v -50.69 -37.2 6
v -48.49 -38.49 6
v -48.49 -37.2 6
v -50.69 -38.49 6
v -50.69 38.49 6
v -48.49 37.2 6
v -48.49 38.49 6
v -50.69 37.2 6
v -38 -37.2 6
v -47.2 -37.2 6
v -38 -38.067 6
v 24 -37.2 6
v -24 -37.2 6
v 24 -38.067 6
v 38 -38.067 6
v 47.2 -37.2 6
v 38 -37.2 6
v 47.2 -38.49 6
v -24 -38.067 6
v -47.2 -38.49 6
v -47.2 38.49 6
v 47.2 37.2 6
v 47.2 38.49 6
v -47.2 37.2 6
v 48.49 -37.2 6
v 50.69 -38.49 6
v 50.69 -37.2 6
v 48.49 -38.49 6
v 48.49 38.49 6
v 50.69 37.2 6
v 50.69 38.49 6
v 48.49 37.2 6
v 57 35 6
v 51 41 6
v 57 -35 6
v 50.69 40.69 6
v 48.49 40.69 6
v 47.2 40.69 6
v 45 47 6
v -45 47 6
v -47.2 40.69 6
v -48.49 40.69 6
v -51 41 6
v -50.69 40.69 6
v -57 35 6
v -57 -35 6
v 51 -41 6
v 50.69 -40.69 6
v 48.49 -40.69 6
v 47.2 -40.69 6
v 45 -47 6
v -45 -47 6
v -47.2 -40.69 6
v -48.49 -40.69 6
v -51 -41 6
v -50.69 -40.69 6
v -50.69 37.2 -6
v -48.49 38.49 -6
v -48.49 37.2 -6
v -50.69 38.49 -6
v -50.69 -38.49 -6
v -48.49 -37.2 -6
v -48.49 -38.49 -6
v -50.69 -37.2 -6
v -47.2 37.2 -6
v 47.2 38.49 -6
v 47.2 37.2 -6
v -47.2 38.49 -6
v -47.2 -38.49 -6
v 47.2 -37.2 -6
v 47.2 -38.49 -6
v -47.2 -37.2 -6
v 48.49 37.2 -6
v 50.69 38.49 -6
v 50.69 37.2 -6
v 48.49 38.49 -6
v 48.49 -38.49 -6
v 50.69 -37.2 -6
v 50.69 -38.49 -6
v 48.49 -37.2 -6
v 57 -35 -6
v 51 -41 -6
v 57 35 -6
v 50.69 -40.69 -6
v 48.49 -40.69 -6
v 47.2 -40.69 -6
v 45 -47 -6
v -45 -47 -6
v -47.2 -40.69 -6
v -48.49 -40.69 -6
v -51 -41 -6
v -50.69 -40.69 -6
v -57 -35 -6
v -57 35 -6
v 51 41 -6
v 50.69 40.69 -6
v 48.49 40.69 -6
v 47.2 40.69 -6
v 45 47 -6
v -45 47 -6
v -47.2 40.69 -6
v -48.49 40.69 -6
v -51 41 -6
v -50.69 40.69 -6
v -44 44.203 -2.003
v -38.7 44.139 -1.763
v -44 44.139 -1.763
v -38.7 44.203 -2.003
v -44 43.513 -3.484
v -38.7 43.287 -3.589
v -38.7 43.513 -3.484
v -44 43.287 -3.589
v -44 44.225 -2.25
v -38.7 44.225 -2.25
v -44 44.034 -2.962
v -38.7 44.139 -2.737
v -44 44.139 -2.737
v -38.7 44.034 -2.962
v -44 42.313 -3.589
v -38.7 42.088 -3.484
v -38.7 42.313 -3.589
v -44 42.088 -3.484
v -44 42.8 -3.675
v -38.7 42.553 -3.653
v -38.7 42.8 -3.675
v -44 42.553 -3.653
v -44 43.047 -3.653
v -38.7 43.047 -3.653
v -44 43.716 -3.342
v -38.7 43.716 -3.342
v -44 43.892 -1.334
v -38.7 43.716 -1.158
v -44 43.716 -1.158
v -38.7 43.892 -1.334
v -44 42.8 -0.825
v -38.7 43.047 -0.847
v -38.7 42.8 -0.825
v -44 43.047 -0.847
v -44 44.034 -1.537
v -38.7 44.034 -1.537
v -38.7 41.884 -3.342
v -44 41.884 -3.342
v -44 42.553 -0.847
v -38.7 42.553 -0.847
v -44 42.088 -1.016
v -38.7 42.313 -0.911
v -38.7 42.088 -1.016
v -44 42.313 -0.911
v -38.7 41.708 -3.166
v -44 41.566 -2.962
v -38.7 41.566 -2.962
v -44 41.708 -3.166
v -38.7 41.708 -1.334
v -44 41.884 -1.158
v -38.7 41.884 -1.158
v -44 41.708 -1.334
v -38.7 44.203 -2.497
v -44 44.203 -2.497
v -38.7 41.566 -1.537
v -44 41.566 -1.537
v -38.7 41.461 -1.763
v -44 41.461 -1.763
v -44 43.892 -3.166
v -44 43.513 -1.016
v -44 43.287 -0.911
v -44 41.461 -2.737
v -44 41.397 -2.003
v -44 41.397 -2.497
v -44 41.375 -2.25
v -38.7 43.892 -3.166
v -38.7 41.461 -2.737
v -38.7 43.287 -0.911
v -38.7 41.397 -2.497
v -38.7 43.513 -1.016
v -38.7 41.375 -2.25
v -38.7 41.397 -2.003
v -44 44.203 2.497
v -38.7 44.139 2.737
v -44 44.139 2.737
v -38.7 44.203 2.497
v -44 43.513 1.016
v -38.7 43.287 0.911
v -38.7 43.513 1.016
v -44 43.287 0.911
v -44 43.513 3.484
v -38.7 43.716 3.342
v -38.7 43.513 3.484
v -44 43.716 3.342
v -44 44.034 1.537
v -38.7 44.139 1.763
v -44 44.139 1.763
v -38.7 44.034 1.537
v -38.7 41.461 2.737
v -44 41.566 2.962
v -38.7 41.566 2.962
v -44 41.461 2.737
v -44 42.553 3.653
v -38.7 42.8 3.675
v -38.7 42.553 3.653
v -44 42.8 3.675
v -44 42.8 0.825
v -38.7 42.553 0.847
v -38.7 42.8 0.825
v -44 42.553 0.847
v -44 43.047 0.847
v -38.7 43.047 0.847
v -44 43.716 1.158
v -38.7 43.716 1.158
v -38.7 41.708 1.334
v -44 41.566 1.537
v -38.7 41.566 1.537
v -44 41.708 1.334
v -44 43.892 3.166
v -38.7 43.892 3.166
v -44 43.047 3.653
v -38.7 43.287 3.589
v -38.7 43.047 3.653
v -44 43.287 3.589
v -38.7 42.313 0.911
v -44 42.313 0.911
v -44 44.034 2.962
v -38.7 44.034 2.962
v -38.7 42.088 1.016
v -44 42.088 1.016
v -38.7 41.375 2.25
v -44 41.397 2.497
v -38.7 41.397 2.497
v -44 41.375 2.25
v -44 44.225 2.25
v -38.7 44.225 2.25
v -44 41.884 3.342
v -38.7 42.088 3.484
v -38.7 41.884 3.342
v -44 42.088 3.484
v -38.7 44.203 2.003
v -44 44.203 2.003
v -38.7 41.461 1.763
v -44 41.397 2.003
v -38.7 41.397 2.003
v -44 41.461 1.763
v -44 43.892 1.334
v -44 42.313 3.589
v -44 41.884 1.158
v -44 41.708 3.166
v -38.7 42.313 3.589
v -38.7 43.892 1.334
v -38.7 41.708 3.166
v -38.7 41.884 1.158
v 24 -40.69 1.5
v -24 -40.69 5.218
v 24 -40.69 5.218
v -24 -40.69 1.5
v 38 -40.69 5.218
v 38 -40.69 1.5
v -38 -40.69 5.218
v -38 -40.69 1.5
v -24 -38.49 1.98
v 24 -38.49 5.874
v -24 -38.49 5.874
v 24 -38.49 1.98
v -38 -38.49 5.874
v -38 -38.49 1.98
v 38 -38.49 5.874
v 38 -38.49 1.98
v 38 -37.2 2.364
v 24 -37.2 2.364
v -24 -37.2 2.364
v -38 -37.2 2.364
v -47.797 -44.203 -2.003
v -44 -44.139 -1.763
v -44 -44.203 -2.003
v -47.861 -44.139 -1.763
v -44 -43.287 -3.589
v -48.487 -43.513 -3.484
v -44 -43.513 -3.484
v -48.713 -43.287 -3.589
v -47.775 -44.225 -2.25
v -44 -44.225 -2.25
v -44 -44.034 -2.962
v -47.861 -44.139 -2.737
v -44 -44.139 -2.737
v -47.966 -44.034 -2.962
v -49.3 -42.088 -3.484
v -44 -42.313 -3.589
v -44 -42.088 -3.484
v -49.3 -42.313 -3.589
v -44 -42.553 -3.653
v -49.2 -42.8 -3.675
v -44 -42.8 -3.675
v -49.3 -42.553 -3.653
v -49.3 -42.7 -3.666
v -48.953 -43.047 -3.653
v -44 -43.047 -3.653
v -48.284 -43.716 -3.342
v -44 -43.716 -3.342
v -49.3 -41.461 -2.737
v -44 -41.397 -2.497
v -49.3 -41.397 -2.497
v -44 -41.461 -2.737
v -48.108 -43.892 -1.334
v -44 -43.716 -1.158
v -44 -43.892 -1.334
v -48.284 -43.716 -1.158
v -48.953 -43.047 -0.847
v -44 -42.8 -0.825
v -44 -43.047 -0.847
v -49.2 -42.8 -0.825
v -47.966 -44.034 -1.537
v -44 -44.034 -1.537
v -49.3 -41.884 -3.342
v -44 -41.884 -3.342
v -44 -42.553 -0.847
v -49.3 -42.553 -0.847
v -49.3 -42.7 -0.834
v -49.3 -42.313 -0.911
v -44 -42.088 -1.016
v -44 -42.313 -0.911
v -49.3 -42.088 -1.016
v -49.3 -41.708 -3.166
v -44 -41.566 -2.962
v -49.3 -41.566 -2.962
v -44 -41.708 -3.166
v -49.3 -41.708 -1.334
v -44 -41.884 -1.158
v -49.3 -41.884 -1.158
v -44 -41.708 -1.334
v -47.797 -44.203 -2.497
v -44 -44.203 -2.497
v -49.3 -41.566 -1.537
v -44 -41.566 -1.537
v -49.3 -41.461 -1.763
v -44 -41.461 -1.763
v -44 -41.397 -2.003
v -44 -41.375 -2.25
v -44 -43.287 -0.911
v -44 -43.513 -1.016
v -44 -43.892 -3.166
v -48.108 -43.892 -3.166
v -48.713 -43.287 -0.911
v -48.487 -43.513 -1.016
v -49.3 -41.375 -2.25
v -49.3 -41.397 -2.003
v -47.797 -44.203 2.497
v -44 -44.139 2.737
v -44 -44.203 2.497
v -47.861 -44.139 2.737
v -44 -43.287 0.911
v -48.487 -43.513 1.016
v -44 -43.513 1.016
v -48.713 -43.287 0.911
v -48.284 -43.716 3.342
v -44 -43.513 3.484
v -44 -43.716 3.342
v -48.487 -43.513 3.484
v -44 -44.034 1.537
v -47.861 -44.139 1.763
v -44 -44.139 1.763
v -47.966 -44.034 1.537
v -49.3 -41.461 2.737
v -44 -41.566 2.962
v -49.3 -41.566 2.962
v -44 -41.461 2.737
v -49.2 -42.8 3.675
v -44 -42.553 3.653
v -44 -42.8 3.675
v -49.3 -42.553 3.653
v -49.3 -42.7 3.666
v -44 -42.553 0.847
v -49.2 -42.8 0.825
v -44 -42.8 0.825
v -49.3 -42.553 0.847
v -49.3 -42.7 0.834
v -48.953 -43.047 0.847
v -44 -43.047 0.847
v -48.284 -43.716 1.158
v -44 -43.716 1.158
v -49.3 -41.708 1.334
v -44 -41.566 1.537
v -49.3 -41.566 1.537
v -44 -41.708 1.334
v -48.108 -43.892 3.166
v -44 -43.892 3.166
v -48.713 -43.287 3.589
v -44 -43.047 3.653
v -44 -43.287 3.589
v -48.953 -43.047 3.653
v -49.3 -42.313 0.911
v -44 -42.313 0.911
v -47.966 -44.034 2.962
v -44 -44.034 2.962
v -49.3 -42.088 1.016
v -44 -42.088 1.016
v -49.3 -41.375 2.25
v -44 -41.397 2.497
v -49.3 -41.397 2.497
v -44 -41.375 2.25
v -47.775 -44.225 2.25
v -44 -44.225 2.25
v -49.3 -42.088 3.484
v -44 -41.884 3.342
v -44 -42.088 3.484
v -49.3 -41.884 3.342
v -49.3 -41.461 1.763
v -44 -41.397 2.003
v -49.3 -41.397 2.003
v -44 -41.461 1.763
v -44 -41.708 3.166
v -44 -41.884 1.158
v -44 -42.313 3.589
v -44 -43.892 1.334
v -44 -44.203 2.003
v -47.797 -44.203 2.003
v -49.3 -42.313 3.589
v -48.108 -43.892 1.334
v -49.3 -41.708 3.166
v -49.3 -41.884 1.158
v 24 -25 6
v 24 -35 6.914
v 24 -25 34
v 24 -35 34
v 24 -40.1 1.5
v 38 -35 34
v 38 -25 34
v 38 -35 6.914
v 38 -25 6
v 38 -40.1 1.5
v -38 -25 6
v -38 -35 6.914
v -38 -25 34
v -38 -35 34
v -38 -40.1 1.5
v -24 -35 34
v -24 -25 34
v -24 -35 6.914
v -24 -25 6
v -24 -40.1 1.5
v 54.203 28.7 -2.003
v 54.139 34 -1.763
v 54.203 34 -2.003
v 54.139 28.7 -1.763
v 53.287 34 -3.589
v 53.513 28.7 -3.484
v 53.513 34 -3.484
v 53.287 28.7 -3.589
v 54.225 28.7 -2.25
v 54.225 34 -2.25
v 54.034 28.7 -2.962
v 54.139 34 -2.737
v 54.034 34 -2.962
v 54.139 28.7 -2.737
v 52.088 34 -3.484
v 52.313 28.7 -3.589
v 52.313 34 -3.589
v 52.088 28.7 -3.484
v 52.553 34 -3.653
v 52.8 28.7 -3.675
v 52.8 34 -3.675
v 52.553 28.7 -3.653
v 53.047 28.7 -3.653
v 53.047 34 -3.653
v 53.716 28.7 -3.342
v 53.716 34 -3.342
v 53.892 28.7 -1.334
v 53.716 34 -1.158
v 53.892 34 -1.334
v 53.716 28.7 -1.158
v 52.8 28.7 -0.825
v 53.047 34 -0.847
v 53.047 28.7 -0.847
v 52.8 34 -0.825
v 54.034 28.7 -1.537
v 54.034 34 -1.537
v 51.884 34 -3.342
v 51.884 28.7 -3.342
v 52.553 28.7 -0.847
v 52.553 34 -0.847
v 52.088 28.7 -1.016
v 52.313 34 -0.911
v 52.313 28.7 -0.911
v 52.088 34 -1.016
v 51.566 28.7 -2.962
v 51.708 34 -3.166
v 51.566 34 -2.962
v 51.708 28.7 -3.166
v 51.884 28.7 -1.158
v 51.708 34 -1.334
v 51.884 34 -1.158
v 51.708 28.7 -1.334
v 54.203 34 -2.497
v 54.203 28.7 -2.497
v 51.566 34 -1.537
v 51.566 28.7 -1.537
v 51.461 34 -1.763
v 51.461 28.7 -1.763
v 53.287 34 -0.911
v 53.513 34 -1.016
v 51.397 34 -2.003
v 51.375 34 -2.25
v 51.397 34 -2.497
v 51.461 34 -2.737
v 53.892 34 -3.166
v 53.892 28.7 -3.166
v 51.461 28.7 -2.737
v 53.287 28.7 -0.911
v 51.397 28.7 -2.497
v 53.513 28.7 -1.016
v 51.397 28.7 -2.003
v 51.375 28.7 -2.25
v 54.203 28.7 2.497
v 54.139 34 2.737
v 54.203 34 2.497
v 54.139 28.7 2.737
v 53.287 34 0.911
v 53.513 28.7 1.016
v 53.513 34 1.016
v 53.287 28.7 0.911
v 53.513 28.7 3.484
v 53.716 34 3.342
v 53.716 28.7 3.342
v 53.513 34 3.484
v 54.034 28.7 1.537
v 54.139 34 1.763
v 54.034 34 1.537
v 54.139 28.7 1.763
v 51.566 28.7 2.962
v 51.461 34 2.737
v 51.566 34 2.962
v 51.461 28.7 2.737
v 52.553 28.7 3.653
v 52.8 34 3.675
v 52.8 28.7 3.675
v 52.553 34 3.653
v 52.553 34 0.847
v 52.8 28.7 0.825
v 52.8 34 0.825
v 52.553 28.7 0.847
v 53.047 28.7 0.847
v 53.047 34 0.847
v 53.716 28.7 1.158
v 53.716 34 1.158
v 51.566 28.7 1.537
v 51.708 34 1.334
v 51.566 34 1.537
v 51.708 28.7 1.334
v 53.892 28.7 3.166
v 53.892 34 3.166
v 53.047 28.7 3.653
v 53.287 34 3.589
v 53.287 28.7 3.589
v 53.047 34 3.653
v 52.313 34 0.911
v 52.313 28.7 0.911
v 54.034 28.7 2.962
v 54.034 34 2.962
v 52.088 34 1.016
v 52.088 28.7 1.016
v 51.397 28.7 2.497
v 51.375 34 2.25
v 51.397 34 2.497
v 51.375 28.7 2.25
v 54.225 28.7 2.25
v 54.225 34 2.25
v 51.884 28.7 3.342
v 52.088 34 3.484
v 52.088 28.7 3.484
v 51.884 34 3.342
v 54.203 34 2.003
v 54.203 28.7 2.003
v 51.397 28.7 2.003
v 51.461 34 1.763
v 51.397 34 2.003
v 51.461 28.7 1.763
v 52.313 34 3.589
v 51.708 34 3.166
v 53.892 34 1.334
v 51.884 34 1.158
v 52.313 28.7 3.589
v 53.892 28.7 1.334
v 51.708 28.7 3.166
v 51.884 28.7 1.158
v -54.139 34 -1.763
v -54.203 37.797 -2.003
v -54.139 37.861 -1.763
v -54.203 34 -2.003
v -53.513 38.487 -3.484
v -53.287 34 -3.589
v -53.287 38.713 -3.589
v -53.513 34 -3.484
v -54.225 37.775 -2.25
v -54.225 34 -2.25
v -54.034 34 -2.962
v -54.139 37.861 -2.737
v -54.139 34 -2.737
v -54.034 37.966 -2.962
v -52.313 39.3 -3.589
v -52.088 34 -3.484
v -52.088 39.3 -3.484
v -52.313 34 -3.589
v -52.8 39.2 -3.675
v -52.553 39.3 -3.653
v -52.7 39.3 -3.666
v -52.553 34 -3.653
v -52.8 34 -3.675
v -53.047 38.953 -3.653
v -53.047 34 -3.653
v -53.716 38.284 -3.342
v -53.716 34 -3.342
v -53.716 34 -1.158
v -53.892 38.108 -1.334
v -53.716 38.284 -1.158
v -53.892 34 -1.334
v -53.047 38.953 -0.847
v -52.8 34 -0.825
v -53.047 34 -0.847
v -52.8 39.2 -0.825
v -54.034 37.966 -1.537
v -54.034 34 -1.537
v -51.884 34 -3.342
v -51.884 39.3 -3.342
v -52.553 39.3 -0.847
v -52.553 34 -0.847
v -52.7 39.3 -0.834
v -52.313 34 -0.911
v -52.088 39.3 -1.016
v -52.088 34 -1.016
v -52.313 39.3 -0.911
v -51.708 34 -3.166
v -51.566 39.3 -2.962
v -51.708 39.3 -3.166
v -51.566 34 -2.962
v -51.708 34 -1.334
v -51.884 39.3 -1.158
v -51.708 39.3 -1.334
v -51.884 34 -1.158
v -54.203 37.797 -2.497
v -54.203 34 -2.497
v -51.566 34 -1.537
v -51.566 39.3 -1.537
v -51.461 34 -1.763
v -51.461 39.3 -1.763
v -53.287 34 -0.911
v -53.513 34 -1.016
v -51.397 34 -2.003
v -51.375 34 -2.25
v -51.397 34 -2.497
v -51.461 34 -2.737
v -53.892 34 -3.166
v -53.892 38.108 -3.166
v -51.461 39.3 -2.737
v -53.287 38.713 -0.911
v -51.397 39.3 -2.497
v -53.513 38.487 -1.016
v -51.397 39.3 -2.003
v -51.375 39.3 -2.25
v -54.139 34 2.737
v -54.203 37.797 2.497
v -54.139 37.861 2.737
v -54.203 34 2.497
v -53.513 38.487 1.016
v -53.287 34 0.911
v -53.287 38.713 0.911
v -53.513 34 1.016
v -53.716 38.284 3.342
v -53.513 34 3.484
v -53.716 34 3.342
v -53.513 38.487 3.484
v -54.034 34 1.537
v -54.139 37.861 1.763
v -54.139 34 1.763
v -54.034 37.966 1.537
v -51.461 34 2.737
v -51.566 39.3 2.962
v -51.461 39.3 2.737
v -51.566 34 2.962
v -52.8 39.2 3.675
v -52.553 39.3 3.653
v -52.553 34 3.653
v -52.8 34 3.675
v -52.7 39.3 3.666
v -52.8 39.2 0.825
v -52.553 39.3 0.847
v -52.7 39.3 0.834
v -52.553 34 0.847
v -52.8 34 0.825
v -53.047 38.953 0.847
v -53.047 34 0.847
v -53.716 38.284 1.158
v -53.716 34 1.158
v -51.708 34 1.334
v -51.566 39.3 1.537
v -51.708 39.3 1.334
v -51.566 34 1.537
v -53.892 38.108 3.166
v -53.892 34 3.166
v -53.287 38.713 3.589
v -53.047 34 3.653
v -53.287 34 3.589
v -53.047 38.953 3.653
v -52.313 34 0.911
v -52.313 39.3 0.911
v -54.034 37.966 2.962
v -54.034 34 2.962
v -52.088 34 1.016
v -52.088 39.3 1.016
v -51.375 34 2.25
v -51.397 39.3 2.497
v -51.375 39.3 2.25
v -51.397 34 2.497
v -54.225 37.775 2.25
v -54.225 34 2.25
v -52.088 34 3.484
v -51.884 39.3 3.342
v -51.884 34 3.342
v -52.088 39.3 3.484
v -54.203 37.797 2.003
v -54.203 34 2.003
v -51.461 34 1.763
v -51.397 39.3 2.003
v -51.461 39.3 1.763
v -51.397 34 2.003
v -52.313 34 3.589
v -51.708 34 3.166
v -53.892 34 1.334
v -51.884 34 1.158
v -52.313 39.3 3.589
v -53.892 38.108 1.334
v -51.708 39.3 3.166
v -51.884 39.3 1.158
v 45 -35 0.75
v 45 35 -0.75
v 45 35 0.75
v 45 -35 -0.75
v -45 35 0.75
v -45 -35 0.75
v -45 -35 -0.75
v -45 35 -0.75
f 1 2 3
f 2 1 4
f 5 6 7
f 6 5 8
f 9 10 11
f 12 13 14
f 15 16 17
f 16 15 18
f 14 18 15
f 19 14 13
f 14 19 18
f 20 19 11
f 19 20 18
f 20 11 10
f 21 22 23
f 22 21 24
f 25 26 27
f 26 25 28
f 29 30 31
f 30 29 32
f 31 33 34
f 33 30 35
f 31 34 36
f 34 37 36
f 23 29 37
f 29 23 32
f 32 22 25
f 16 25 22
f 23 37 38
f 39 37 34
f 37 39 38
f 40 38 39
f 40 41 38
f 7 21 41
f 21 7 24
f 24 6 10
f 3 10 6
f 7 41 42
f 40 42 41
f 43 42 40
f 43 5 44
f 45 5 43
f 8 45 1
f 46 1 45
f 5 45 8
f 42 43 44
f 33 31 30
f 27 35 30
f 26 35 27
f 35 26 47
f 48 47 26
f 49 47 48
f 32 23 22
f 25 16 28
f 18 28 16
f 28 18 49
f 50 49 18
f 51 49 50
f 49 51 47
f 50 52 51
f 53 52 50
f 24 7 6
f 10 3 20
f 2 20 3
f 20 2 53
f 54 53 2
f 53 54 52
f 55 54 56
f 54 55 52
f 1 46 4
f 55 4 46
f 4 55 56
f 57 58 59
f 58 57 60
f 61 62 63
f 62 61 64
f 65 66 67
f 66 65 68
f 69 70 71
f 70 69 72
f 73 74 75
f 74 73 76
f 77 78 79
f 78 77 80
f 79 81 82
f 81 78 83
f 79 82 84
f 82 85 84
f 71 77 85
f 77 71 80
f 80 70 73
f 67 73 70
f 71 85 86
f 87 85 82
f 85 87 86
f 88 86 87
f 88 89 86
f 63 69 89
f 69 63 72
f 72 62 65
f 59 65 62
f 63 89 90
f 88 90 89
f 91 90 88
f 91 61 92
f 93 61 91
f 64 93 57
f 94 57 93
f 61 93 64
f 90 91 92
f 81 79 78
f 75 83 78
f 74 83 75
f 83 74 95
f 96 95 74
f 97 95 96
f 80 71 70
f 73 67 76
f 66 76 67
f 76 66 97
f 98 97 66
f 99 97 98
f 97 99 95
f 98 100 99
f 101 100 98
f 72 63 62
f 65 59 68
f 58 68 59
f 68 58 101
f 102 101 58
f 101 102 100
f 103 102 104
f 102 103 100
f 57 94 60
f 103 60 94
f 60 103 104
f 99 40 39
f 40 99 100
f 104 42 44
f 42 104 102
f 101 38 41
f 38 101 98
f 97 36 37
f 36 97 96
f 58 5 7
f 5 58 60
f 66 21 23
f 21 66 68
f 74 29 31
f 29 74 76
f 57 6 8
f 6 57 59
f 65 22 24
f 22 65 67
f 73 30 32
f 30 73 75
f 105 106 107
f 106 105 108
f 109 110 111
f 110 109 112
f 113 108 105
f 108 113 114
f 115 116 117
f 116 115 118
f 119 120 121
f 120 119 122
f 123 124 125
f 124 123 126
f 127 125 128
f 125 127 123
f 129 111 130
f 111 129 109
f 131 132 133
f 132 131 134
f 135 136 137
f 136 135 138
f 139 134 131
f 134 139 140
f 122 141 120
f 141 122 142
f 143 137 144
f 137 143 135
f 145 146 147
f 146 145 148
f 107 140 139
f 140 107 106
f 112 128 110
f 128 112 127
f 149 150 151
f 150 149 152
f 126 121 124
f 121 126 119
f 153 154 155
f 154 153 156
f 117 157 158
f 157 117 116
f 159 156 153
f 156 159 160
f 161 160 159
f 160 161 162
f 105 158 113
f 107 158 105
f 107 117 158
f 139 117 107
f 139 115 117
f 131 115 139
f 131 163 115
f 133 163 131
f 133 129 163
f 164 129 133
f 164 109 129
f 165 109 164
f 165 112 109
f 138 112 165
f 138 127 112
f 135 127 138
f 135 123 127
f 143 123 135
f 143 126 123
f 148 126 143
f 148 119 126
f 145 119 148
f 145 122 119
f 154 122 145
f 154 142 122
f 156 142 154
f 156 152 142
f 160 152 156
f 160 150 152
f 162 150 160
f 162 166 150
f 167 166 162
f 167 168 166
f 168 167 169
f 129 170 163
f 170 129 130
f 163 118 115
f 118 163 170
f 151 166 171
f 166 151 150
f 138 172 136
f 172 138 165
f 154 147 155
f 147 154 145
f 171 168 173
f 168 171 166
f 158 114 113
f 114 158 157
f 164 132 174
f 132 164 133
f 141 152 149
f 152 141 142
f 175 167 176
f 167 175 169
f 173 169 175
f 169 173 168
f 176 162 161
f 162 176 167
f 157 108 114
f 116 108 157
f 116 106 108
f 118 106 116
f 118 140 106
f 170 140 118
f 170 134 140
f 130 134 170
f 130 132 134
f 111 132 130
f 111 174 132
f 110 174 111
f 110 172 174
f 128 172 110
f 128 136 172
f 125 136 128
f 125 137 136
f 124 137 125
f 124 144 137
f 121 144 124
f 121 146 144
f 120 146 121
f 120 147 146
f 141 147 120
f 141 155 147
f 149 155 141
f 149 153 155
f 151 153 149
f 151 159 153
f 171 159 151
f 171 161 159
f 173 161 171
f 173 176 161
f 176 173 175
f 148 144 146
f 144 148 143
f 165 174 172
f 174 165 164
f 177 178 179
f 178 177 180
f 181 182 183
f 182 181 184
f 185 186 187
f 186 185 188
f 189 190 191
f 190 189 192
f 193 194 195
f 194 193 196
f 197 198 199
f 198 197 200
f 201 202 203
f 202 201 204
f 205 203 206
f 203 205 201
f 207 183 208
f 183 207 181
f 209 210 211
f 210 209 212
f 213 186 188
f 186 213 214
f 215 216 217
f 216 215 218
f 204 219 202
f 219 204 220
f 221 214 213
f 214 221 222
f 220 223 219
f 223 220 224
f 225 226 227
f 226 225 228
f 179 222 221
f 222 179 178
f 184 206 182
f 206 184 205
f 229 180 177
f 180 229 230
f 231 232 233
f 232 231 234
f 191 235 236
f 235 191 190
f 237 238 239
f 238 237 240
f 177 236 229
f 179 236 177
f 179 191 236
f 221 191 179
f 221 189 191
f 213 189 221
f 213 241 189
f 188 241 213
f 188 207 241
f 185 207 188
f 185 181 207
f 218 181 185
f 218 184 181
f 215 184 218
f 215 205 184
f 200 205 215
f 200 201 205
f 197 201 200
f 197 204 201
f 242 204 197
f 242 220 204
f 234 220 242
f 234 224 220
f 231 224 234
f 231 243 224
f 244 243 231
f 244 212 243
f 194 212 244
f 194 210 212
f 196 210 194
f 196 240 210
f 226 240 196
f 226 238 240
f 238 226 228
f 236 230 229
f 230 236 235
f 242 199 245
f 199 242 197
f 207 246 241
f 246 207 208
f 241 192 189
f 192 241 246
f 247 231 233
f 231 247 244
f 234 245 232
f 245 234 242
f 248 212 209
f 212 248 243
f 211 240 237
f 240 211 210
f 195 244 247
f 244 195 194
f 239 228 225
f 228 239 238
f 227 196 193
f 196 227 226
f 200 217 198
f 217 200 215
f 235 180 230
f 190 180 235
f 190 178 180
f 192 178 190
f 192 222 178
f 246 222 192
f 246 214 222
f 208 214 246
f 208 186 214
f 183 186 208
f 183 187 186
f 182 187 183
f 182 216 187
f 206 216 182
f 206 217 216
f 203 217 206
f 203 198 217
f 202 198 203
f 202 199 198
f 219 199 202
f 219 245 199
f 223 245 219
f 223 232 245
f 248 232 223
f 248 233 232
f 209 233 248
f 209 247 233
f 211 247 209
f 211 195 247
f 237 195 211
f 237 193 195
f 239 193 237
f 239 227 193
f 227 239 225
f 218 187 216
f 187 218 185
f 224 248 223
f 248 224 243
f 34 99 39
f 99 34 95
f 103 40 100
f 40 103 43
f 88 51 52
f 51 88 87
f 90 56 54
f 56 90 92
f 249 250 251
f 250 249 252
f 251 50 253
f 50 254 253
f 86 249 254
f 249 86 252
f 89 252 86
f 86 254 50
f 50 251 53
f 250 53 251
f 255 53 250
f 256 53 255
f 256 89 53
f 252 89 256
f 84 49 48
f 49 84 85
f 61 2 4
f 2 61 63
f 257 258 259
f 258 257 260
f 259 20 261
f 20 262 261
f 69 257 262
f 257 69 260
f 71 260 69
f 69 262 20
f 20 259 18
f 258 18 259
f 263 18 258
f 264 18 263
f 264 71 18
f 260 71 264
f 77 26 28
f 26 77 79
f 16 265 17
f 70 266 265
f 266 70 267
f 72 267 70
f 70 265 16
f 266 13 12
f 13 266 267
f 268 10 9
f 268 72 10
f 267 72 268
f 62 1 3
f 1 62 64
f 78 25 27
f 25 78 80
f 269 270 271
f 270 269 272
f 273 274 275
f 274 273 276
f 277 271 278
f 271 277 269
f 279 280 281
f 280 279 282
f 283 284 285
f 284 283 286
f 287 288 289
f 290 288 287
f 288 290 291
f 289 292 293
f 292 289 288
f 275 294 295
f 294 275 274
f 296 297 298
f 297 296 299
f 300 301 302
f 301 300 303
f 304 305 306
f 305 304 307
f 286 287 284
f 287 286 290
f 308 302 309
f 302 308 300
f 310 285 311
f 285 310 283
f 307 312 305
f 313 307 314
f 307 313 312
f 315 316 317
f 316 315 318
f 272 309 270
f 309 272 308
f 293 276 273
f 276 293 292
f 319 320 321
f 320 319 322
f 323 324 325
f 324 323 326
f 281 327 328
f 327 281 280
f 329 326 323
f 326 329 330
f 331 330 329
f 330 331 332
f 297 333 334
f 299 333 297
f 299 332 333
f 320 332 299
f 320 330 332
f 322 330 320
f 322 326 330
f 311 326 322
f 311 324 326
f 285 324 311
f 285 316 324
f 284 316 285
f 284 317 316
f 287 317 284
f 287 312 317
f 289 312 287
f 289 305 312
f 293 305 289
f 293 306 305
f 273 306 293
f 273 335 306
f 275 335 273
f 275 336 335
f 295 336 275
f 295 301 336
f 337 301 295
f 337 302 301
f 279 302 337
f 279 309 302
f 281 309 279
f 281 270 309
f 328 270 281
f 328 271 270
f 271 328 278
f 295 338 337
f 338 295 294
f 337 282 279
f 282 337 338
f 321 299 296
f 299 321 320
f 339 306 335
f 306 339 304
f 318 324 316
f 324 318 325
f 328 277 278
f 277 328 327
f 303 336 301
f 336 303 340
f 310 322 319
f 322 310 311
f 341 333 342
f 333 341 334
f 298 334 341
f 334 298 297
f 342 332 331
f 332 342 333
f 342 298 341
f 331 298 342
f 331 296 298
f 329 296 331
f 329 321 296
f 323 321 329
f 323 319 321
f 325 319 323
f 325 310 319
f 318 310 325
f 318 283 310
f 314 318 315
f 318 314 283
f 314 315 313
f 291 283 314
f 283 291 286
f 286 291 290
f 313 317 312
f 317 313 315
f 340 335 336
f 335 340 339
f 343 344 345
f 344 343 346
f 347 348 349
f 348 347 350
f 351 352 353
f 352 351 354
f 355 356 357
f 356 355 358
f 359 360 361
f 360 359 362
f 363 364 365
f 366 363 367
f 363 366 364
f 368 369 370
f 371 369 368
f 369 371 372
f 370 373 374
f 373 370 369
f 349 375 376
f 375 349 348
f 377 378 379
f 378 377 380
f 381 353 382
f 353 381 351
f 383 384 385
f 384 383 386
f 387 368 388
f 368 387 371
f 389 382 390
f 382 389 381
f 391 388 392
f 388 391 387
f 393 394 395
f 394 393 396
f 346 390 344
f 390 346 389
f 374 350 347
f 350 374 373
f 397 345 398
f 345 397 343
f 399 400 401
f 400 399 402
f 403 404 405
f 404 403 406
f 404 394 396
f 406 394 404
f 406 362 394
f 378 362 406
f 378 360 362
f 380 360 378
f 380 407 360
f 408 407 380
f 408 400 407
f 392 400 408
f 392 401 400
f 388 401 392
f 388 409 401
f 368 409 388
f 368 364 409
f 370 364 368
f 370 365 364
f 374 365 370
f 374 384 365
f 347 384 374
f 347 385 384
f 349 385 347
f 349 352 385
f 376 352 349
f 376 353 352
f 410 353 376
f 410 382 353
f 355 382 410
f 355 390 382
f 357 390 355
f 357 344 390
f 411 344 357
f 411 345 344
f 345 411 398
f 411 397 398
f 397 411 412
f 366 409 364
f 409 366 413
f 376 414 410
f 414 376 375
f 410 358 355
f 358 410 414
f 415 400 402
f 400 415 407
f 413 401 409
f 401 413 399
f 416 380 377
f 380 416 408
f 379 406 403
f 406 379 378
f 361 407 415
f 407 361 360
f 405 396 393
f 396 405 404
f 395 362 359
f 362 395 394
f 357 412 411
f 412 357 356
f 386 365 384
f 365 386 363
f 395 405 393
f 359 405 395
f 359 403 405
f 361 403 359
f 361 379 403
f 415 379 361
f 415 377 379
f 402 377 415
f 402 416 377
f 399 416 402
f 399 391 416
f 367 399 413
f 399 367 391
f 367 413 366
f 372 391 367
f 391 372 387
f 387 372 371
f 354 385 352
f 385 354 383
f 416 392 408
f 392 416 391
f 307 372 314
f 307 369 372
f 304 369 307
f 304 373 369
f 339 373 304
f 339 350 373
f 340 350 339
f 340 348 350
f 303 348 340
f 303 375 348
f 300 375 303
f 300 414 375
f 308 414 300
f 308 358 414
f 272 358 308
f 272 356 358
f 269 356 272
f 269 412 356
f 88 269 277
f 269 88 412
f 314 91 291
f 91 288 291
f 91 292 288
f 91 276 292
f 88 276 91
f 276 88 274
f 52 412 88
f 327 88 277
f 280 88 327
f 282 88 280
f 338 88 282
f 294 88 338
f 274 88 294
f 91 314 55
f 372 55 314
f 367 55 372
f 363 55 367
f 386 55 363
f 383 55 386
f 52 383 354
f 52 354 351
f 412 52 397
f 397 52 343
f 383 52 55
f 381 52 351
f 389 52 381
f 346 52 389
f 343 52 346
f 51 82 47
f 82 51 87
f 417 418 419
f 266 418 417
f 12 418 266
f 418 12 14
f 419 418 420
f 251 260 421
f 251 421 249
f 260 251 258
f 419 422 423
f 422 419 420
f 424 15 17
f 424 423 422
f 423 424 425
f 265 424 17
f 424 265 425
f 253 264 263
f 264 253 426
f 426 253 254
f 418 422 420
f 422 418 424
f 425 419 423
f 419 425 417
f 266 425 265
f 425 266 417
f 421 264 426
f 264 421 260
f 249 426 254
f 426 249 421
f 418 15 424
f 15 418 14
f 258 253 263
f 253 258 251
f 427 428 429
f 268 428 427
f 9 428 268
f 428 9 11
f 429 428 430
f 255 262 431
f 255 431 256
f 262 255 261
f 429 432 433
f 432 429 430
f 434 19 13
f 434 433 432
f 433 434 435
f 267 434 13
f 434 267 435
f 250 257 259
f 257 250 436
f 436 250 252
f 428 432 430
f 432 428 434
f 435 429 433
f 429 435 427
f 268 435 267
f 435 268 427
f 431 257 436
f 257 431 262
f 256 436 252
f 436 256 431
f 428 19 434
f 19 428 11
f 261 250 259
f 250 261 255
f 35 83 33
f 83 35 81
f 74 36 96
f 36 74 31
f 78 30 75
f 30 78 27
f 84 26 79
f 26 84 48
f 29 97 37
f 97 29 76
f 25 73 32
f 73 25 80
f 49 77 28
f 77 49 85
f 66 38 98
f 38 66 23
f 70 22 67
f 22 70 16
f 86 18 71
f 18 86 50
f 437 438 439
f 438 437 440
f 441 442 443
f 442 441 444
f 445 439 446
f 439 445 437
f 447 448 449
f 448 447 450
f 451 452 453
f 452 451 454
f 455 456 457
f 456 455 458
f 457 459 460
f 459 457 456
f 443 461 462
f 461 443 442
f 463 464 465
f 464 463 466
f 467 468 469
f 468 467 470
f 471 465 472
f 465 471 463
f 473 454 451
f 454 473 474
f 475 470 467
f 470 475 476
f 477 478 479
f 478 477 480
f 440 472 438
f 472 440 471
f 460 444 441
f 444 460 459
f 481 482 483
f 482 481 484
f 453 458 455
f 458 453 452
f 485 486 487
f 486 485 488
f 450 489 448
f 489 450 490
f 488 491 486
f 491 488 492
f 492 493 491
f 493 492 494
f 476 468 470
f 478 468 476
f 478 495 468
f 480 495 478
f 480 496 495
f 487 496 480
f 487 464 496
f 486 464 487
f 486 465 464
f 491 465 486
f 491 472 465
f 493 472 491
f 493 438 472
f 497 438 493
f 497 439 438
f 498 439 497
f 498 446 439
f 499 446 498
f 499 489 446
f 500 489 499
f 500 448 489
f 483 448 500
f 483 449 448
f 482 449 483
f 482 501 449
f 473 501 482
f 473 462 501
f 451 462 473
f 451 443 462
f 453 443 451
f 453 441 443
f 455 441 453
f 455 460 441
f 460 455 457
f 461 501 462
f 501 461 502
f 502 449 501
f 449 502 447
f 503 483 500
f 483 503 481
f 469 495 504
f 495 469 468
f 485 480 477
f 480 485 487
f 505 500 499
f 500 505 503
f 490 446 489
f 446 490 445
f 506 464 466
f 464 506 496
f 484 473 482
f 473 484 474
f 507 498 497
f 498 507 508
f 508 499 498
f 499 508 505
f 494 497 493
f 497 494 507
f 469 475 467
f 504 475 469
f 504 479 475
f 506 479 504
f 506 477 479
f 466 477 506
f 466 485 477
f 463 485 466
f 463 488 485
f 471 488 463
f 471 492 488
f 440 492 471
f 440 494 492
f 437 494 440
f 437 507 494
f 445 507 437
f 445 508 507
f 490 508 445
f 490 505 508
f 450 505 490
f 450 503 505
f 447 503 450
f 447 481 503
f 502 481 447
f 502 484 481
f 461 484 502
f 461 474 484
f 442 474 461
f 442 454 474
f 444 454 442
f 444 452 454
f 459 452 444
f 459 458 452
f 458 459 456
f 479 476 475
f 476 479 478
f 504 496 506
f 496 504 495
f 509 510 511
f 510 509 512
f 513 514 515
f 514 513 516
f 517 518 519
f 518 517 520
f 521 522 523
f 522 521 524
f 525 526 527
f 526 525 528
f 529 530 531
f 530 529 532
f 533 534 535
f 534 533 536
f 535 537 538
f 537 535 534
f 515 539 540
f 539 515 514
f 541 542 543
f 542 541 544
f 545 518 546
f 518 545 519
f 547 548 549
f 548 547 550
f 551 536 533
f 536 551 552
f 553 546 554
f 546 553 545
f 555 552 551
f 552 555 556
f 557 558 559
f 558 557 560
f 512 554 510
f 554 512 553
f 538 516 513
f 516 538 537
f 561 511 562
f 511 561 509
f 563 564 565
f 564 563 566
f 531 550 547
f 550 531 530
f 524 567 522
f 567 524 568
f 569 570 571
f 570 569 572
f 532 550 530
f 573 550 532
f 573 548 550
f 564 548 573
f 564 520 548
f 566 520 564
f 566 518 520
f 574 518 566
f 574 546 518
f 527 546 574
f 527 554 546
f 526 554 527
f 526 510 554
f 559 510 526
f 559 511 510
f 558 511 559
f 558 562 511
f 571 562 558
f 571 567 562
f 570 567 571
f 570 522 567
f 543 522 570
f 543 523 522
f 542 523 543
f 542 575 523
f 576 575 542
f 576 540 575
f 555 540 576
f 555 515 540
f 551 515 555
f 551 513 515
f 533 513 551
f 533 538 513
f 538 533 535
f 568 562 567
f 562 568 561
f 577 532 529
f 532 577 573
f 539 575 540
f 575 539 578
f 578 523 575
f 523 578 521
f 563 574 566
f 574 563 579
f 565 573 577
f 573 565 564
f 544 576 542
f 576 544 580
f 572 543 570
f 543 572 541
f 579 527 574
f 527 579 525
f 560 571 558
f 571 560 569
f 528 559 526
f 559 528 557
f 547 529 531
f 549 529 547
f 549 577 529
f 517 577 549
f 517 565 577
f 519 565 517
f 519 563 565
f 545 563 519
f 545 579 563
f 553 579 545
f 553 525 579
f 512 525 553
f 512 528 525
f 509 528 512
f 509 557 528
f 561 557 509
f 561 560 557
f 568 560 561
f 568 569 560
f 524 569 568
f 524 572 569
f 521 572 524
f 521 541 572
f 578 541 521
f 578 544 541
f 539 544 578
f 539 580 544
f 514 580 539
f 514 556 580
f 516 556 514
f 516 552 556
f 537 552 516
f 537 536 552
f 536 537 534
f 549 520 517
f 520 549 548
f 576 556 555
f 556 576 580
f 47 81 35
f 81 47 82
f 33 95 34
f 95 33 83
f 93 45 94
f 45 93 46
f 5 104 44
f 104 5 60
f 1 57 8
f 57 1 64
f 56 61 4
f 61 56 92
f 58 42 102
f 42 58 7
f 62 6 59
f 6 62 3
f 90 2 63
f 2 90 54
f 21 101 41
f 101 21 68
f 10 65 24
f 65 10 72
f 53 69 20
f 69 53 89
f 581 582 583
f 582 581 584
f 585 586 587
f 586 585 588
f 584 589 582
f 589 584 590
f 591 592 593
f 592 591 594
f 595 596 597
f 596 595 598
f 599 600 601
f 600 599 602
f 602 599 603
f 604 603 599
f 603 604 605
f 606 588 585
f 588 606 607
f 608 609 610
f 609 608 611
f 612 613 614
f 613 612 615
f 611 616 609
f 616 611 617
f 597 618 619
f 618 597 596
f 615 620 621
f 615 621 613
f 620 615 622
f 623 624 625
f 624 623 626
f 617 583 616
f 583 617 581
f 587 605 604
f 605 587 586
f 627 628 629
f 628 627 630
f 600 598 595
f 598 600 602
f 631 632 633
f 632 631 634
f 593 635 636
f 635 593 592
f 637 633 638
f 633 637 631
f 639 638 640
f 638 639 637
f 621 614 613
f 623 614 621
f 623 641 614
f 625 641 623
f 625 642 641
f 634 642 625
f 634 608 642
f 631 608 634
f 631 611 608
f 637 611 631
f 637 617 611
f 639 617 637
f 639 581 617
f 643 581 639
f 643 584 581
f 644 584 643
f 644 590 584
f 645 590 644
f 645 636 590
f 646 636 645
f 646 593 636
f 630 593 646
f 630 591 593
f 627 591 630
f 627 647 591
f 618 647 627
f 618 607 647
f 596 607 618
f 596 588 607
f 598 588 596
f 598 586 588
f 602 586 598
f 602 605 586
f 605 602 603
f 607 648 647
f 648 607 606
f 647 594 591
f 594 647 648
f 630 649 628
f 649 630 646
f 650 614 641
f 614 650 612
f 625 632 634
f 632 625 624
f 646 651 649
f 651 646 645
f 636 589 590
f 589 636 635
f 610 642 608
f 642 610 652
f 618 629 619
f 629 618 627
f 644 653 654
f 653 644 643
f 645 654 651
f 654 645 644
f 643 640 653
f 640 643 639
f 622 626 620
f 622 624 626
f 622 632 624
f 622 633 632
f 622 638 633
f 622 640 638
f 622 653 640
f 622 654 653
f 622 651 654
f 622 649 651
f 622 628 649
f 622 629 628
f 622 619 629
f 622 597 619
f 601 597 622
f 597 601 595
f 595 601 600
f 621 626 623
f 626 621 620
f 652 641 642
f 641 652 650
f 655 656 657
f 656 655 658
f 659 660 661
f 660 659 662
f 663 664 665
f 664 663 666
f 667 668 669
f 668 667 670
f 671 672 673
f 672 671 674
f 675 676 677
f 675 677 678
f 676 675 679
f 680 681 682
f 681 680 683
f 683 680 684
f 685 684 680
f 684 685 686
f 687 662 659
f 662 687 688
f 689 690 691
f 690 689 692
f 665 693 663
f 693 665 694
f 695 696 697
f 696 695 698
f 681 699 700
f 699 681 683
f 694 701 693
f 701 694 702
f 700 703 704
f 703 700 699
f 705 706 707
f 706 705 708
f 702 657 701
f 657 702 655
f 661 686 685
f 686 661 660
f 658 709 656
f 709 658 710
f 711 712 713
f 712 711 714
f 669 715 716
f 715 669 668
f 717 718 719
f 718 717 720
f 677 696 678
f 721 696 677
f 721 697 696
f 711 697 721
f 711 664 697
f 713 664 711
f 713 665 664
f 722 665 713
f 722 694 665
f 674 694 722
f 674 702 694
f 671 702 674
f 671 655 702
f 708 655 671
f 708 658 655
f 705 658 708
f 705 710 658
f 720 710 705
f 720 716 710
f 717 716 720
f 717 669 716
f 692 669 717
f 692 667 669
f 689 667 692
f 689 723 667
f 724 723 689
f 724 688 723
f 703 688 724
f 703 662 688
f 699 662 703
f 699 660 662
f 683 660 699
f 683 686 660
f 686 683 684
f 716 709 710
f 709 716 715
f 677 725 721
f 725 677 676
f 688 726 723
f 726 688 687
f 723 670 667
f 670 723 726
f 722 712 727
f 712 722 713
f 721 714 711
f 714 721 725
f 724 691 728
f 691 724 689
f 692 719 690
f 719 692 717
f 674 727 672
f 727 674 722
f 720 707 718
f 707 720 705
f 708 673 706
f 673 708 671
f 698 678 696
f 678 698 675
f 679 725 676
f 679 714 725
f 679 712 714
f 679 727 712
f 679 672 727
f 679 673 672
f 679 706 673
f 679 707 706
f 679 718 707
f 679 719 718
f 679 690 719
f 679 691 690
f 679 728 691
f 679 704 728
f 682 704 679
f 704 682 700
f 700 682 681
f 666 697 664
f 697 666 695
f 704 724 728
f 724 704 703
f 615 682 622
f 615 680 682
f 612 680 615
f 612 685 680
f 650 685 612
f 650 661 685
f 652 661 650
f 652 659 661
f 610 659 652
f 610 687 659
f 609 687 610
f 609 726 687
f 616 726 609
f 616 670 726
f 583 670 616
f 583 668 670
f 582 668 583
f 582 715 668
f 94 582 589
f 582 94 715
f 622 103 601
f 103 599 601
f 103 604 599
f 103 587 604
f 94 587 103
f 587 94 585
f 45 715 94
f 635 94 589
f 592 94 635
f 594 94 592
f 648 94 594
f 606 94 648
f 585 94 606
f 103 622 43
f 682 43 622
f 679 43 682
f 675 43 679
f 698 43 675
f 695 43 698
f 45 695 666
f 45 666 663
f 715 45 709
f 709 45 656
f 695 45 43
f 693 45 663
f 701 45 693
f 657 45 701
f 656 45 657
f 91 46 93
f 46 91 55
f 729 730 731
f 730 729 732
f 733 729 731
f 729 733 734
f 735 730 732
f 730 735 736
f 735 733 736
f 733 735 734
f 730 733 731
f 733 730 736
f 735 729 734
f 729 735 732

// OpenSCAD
// 4-piece PCB picture-frame rails with U-channel + 45° miters + peg/hole corners
// - Correct assembly rotations/placement
// - Print plate layout: no intersections
// - Legs only on bottom rail (smaller)
//
// PCB: 90 x 70 x 1.5 mm
// Units: mm

// ---------------- PCB ----------------
pcb_x  = 90;
pcb_y  = 70;
pcb_t  = 1.5;

// ---------------- Channel fit ----------------
slot_clear = 0.35;        // clearance around PCB thickness
slot_depth = 7.0;         // how deep PCB edge seats into channel (inward from inner edge)

// Rail cross-section
rail_th   = 12.0;         // thickness in the frame plane (border thickness)
rail_depth= 12.0;         // depth out of the frame plane (front/back)
wall      = 3.0;          // wall around slot
face_top  = 4.0;          // material above slot (frame look)

// Slot (U-channel) opening width
slot_w = pcb_t + 2*slot_clear;

// ---------------- Miters ----------------
miter_deg = 45;

// ---------------- Pegs/Holes ----------------
peg_d      = 2.6;
peg_len    = 4.5;
peg_clear  = 0.25;     // hole diameter = peg_d + peg_clear
peg_offset = 7.0;      // from end inward along length
peg_sep_z  = 4.5;      // separation between two pegs along Z
pegs_per_end = 2;      // 1 or 2

// ---------------- Legs (bottom rail only) ----------------
legs_enable = true;
leg_w     = 14.0;      // along rail length
leg_th    = 3.0;
leg_len   = 28.0;      // sticks backward in Z
leg_drop  = 10.0;      // drops down in Y
leg_inset = 20.0;      // from each end

// ---------------- Output ----------------
part = "assembly"; // "top","bottom","left","right","print_plate","assembly"

// ============================================================================
// Local coords for a rail part (before placement):
// - Length runs along +X
// - INNER edge of the frame is at local Y=0 (touches PCB edge)
// - Frame material extends to +Y (outside)
// - Slot opens toward local -Y (so it can slide onto the PCB from the side)
// - Depth is along Z
// ============================================================================

// ---------------- Helpers ----------------
module peg_or_hole(is_peg=true){
  d = is_peg ? peg_d : (peg_d + peg_clear);
  rotate([0,90,0]) cylinder(d=d, h=(peg_len + (is_peg?0:0.8)), $fn=36);
}

module rail_blank(L){
  // Centered in X and Z; Y spans [0..rail_th]
  translate([0, rail_th/2, 0])
    cube([L, rail_th, rail_depth], center=true);
}

module rail_with_slot(L){
  // Cut a U-slot that opens to -Y, centered in Z
  difference(){
    rail_blank(L);

    // Slot center in Y: keep face_top above slot, plus wall
    slot_yc = (face_top + wall) + slot_w/2;

    // Main slot cut, protruding past inner edge (Y=0) so it's open
    translate([0, slot_yc - slot_depth/2 - 0.01, 0])
      cube([L+0.8, slot_w, rail_depth+0.8], center=true);

    // Slightly wider mouth near inner edge to ease insertion
    translate([0, 0.8, 0])
      cube([L+0.8, slot_w + 0.6, rail_depth+0.8], center=true);
  }
}

module miter_cut(L, end=+1){
  // end=+1 cuts +X end, end=-1 cuts -X end
  translate([end*(L/2), rail_th/2, 0])
    rotate([0,0,end*miter_deg])
      translate([end*80, 0, 0])
        cube([160, rail_th*4, rail_depth*4], center=true);
}

module add_end_features(L, end=+1, male=true){
  x = end*(L/2 - peg_offset);
  for(i=[0:pegs_per_end-1]){
    dz = (pegs_per_end==1) ? 0 : (i==0 ? -peg_sep_z/2 : +peg_sep_z/2);
    translate([x, rail_th*0.65, dz]) peg_or_hole(is_peg=male);
  }
}

module rail_part(L, male_end="+", female_end="-", is_bottom=false){
  difference(){
    union(){
      rail_with_slot(L);
      if (male_end == "+") add_end_features(L, end=+1, male=true);
      if (male_end == "-") add_end_features(L, end=-1, male=true);
    }

    // Miters
    miter_cut(L, end=+1);
    miter_cut(L, end=-1);

    // Holes
    if (female_end == "+") add_end_features(L, end=+1, male=false);
    if (female_end == "-") add_end_features(L, end=-1, male=false);
  }

  // Legs only on bottom rail
  if (is_bottom && legs_enable){
    for (sx=[-1,1]){
      x = sx*(L/2 - leg_inset);

      // rear foot
      translate([x, -leg_drop/2, rail_depth/2 + leg_len/2])
        cube([leg_w, leg_drop, leg_len], center=true);

      // brace
      hull(){
        translate([x, rail_th*0.55, rail_depth*0.25])
          cube([leg_w, leg_th, leg_th], center=true);
        translate([x, -leg_drop + leg_th/2, rail_depth/2 + leg_th/2])
          cube([leg_w, leg_th, leg_th], center=true);
      }
    }
  }
}

// ---------------- Rail lengths for proper miters ----------------
// For a mitered frame, each rail's overall length ≈ inner_span + rail_th
L_topbot = pcb_x + rail_th;
L_leftrt = pcb_y + rail_th;

// Peg/hole convention so corners mate:
// - Top:    male +X, female -X
// - Right:  male +X, female -X
// - Bottom: male -X, female +X
// - Left:   male -X, female +X
module top_rail()    { rail_part(L_topbot, male_end="+", female_end="-", is_bottom=false); }
module bottom_rail() { rail_part(L_topbot, male_end="-", female_end="+", is_bottom=true ); }
module right_rail()  { rail_part(L_leftrt, male_end="+", female_end="-", is_bottom=false); }
module left_rail()   { rail_part(L_leftrt, male_end="-", female_end="+", is_bottom=false); }

// ---------------- Assembly preview ----------------
module assembly(){
  // PCB preview (centered)
  color([0,0.6,0,0.35]) cube([pcb_x, pcb_y, pcb_t], center=true);

  // Place rails so their INNER edge (local Y=0) aligns to PCB edge.
  // Since inner edge is at local Y=0, we translate to PCB edge directly.

  // Top edge (+Y): slot should open inward (toward -Y), which is already local -Y.
  translate([0, +pcb_y/2, 0])
    top_rail();

  // Bottom edge (-Y): inward is +Y, so rotate 180° about Z to flip local -Y to +Y.
  translate([0, -pcb_y/2, 0])
    rotate([0,0,180])
      bottom_rail();

  // Right edge (+X): rail length must run along Y.
  // Need slot opening toward center (toward -X). We want local -Y => global -X.
  // rotate -90 about Z maps local -Y to global -X.
  translate([+pcb_x/2, 0, 0])
    rotate([0,0,-90])
      right_rail();

  // Left edge (-X): inward is +X. Need local -Y => global +X.
  // rotate +90 about Z maps local -Y to global +X.
  translate([-pcb_x/2, 0, 0])
    rotate([0,0, 90])
      left_rail();
}

// ---------------- Print layout (no intersections) ----------------
module print_plate(){
  gap = 12;

  // Put each part on the bed: since parts are centered in Z, lift by rail_depth/2.
  zlift = rail_depth/2;

  // Bounding sizes (rough) used for spacing:
  w_long = L_topbot;
  w_short= L_leftrt;
  h_y    = rail_th;

  translate([0, 0, zlift])                 top_rail();
  translate([0, -(h_y + gap), zlift])      bottom_rail();

  translate([0, +(h_y + gap), zlift])      right_rail();
  translate([0, +(2*(h_y + gap)), zlift])  left_rail();

  // If you want a more compact plate, I can pack them in a 2x2 grid.
}

// ---------------- Output switch ----------------
if (part=="top")         top_rail();
else if (part=="bottom") bottom_rail();
else if (part=="right")  right_rail();
else if (part=="left")   left_rail();
else if (part=="print_plate") print_plate();
else if (part=="assembly")    assembly();
